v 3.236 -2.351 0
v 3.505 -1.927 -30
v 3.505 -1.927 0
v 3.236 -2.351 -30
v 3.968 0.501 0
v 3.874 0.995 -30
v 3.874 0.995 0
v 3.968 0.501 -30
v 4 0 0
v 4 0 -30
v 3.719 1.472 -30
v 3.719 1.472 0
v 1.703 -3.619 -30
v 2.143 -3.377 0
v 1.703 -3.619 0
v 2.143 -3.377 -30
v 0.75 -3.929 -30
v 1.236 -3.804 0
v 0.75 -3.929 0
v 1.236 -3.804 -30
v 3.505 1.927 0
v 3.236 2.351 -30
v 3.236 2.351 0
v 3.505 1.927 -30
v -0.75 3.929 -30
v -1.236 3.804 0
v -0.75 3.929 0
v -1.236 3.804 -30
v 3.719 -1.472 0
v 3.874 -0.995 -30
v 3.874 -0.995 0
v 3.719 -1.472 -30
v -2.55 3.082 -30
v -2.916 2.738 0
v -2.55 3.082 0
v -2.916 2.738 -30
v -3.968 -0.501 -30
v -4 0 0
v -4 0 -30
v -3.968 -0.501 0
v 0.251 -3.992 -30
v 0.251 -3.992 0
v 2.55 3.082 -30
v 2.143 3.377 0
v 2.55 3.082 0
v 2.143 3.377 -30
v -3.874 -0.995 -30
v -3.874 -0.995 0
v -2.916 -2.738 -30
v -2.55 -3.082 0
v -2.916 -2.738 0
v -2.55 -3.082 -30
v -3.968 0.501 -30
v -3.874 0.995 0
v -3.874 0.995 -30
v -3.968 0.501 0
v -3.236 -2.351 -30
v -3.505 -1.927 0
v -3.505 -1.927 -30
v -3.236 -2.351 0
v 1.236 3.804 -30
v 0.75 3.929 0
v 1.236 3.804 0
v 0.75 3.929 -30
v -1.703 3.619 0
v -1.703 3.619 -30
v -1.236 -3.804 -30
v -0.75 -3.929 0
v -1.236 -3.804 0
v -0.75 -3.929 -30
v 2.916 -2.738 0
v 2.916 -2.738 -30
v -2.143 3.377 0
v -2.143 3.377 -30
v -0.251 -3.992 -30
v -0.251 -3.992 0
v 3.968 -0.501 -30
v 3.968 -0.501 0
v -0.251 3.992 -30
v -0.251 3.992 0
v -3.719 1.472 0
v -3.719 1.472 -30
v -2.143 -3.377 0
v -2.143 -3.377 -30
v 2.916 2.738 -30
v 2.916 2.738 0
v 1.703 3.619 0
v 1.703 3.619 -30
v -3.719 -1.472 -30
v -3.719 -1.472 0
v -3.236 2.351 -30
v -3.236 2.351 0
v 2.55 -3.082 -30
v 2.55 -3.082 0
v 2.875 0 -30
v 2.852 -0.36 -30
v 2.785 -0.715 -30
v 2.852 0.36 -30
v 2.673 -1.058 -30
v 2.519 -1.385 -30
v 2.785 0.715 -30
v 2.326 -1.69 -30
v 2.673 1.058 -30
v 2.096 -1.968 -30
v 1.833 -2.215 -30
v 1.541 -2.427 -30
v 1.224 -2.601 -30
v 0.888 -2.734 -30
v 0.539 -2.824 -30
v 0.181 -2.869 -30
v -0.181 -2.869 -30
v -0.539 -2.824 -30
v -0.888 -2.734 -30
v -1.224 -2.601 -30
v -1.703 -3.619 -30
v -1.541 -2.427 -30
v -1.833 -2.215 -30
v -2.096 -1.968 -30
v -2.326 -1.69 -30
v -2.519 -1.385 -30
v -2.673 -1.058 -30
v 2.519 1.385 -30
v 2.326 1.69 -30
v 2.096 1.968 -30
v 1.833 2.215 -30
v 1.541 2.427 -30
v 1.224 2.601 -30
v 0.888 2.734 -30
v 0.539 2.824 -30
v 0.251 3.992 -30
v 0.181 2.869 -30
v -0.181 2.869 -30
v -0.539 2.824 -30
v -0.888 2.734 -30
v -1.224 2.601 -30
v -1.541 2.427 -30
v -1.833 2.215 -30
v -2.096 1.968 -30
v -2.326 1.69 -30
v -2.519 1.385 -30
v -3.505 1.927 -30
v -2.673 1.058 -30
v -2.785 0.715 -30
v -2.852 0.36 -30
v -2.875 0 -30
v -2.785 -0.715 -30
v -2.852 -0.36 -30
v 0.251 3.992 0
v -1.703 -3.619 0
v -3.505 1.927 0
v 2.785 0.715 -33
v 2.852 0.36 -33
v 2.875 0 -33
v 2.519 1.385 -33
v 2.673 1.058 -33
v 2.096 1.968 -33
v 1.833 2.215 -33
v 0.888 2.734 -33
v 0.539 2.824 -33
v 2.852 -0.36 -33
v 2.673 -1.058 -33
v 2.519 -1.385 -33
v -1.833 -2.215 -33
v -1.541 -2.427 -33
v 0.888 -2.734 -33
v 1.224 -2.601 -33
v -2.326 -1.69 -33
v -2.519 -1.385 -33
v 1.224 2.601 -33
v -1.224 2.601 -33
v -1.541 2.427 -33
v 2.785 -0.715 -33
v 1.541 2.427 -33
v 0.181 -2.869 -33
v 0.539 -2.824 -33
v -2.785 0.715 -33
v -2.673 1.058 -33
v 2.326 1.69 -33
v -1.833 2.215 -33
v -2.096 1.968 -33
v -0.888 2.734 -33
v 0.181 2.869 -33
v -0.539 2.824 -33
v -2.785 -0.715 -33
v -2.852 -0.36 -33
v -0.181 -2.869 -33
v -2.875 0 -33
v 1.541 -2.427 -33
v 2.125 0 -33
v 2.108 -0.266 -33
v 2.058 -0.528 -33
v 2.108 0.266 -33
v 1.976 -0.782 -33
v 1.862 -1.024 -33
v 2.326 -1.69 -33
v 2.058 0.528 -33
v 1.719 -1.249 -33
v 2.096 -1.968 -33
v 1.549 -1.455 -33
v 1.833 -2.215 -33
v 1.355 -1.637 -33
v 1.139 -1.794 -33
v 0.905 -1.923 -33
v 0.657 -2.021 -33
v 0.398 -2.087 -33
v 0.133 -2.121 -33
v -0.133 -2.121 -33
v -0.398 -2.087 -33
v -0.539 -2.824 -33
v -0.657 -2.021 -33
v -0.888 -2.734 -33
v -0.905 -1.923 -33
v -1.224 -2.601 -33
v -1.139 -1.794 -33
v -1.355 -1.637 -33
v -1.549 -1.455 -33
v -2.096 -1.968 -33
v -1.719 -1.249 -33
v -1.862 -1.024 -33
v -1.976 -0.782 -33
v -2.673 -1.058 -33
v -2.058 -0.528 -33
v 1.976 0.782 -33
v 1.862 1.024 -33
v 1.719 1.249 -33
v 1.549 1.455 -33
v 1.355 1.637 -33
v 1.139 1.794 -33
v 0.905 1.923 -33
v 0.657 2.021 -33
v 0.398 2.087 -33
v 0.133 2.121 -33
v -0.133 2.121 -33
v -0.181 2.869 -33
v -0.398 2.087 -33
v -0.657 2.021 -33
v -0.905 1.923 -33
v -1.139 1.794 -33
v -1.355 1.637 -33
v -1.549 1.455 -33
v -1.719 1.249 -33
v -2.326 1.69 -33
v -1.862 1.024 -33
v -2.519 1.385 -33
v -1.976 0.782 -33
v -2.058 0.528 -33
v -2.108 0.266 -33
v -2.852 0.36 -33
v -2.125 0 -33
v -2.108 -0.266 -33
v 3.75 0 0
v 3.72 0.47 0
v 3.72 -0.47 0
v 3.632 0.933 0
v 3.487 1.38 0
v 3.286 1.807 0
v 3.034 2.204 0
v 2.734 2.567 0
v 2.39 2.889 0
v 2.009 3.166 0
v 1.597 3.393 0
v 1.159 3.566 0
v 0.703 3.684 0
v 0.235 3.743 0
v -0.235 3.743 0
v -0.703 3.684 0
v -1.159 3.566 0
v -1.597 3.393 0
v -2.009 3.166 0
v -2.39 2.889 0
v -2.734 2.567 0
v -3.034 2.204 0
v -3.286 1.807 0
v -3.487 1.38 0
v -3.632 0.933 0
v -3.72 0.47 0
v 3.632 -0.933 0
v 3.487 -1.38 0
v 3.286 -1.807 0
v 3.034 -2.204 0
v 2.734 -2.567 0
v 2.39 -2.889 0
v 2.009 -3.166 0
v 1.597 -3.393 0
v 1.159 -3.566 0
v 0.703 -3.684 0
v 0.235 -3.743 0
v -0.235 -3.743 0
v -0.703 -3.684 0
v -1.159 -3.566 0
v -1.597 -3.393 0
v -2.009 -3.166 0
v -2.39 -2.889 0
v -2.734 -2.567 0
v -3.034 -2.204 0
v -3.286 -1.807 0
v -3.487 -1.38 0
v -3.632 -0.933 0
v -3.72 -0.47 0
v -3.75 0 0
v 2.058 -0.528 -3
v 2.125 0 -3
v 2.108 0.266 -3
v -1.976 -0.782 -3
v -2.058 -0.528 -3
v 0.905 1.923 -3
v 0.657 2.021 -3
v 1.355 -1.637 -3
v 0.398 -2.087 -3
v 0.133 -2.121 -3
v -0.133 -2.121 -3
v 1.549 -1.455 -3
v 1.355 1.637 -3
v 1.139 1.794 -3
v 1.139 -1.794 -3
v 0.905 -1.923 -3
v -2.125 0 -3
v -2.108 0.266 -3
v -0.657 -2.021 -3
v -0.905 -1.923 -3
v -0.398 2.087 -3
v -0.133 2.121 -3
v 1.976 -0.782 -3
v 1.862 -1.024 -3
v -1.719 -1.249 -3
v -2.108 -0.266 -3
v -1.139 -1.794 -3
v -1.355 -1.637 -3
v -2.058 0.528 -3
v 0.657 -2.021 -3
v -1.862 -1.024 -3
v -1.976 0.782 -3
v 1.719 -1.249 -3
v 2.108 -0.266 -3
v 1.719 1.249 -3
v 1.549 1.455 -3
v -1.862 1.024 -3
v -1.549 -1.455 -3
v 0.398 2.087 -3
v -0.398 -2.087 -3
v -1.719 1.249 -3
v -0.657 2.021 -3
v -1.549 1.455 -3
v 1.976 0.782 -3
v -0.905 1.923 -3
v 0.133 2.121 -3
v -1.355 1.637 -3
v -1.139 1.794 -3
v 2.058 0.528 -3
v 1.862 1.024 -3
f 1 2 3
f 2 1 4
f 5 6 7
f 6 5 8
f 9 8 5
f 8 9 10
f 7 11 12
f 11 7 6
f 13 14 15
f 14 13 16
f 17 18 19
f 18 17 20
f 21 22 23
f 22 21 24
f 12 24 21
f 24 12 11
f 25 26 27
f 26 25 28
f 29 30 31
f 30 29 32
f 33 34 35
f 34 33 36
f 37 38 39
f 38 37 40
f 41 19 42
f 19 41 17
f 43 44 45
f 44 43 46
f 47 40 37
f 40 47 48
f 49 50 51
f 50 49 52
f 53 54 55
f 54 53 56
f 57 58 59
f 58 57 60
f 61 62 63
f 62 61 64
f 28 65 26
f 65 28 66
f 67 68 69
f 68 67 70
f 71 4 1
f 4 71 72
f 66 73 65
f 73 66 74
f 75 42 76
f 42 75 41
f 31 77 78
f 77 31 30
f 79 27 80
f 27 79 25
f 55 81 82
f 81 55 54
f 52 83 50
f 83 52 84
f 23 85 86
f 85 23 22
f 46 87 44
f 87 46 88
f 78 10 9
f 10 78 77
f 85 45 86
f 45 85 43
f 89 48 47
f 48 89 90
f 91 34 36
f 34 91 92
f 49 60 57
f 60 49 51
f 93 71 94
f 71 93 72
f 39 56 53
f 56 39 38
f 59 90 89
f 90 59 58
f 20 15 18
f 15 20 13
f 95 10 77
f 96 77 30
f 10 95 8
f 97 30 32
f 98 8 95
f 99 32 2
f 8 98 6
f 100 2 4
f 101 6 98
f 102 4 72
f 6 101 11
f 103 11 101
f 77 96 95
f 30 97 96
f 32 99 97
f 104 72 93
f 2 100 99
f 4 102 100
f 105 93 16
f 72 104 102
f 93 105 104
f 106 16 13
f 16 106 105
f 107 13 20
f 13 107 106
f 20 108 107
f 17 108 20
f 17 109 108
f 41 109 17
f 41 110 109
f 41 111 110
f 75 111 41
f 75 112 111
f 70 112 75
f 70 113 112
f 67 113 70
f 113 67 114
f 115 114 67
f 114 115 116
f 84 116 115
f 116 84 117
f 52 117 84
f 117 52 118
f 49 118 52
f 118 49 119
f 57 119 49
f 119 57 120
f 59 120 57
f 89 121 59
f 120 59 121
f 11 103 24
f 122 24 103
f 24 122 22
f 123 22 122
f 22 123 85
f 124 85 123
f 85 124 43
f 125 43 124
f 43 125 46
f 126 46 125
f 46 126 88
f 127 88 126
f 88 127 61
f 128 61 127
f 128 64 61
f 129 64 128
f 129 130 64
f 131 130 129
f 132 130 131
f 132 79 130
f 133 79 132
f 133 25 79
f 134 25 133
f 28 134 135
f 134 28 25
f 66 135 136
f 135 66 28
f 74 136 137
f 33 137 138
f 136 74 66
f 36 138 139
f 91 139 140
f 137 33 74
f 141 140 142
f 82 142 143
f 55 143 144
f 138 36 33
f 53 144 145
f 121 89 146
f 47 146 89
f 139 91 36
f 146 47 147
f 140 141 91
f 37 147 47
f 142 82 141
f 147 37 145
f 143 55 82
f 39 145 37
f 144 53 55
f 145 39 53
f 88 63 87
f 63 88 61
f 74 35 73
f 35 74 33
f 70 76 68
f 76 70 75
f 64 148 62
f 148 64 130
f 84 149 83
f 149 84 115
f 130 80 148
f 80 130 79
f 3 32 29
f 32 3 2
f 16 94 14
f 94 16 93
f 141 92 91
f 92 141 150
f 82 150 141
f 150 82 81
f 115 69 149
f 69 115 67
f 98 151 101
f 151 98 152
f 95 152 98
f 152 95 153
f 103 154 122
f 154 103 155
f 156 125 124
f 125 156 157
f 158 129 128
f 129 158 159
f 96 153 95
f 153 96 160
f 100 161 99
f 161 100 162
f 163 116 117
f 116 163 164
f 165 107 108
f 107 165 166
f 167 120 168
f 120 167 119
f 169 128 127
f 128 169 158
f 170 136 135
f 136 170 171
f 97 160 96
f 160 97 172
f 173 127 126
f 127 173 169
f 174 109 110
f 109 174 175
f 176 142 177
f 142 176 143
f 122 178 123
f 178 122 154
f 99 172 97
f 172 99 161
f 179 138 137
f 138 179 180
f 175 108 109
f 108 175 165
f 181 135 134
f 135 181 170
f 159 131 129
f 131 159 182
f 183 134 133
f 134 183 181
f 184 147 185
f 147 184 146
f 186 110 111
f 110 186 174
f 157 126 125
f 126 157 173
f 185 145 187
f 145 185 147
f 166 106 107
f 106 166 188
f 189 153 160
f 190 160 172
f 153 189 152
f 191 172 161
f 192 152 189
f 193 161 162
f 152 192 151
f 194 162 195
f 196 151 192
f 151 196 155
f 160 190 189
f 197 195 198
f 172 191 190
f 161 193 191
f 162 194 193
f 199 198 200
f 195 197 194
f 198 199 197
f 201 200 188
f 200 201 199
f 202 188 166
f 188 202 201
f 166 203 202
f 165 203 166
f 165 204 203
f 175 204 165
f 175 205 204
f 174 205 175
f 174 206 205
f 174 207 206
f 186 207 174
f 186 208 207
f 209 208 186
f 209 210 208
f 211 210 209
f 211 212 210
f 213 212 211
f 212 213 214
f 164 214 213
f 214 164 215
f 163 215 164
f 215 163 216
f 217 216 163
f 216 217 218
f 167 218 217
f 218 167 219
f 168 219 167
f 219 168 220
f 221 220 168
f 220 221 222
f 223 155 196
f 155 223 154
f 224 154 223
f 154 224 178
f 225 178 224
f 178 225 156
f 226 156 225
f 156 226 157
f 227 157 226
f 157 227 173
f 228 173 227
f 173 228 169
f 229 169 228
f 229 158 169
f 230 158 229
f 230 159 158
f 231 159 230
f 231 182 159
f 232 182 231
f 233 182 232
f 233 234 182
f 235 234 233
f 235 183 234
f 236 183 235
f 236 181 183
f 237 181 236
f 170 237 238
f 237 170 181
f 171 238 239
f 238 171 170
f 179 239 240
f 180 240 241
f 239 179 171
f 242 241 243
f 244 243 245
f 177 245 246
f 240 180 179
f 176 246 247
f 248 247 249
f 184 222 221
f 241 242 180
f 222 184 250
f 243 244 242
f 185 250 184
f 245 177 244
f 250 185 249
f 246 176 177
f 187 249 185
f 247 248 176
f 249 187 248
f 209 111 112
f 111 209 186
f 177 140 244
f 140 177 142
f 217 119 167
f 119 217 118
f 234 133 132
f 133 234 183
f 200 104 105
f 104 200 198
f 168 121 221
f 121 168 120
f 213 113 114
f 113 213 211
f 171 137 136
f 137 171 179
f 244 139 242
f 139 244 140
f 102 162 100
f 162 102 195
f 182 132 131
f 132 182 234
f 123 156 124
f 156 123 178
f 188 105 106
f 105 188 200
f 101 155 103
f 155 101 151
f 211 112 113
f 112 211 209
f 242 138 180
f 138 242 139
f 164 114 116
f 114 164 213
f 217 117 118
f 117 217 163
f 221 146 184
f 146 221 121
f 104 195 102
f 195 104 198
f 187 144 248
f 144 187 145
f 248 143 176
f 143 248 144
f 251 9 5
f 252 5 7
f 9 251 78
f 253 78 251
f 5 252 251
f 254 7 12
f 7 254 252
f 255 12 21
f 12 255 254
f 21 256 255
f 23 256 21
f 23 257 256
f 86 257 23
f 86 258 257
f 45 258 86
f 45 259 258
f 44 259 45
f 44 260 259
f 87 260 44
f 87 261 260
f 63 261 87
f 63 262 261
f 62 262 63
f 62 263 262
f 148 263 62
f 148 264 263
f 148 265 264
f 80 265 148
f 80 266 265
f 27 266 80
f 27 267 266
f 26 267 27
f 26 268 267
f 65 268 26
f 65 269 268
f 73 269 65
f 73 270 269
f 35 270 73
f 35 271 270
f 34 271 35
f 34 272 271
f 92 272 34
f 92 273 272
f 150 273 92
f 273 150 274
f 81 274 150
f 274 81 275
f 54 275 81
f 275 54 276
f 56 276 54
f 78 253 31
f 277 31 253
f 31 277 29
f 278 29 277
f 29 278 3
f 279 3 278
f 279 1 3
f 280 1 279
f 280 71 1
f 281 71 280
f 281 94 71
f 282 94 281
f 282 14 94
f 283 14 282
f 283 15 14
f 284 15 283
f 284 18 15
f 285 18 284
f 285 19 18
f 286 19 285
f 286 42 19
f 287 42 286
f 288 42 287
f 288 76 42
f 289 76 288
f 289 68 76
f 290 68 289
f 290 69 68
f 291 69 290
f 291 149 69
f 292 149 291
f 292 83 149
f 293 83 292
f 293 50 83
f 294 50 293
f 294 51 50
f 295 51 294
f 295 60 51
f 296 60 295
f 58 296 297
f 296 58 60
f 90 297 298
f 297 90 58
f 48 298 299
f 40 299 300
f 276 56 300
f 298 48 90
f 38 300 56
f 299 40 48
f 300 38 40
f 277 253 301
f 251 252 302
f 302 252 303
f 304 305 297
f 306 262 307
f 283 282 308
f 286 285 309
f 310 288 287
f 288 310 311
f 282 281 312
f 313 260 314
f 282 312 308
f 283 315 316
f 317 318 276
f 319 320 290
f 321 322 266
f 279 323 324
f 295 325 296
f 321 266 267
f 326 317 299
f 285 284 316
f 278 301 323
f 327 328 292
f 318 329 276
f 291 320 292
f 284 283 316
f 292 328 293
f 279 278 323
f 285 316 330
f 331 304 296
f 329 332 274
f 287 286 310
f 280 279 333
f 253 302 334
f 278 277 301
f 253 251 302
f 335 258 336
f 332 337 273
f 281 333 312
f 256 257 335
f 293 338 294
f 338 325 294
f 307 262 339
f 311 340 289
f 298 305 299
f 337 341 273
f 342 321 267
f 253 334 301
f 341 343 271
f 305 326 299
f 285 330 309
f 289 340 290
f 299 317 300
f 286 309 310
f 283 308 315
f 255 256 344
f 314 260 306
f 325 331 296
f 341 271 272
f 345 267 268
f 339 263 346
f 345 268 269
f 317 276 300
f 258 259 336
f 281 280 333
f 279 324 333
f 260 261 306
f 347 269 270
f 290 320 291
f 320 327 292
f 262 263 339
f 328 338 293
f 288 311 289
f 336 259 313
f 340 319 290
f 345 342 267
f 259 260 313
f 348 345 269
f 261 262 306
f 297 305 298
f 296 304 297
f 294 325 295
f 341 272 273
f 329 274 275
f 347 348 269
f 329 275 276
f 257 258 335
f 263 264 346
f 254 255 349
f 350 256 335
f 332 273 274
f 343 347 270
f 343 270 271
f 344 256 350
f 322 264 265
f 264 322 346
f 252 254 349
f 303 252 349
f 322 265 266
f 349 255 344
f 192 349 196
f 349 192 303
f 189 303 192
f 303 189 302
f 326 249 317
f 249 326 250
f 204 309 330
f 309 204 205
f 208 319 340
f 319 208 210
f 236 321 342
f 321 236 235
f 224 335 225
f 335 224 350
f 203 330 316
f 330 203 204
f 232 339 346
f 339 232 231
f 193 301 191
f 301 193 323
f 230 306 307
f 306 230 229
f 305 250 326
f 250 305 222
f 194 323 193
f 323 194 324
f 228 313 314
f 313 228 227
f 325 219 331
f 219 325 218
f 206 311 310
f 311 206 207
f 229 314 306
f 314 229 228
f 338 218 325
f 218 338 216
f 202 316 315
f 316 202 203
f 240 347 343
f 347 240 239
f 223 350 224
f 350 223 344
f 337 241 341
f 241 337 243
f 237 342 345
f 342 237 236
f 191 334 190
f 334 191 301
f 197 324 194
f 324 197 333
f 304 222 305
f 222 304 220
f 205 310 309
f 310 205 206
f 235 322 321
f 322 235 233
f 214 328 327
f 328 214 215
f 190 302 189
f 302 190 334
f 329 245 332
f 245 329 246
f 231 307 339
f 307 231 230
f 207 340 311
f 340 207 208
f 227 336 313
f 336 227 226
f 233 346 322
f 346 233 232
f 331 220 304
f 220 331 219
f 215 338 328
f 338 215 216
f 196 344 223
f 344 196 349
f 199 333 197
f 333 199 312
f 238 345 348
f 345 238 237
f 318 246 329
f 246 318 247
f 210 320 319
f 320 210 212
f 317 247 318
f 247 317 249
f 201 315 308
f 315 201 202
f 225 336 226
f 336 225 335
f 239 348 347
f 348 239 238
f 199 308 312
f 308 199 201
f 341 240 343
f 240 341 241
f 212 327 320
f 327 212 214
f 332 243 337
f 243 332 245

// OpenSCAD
$fn = 50;

difference() {
	union() {
		translate(v = [0, 0, -30.0]) {
			cylinder(h = 33, r = 4.0);
		}
		#translate(v = [0, 0, -33.0]) {
			cylinder(h = 33, r = 2.875);
		}
	}
	union() {
		translate(v = [0, 0, 0]) {
			rotate(a = [0, 0, 0]) {
				difference() {
					union() {
						translate(v = [0, 0, -33.0]) {
							cylinder(h = 33, r = 2.0);
						}
						translate(v = [0, 0, -3]) {
							cylinder(h = 3, r1 = 2.125, r2 = 3.75);
						}
						translate(v = [0, 0, -33.0]) {
							cylinder(h = 33, r = 2.125);
						}
						translate(v = [0, 0, -33.0]) {
							cylinder(h = 33, r = 2.0);
						}
					}
					union();
				}
			}
		}
		#cylinder(h = 3, r = 5.0);
	}
}
